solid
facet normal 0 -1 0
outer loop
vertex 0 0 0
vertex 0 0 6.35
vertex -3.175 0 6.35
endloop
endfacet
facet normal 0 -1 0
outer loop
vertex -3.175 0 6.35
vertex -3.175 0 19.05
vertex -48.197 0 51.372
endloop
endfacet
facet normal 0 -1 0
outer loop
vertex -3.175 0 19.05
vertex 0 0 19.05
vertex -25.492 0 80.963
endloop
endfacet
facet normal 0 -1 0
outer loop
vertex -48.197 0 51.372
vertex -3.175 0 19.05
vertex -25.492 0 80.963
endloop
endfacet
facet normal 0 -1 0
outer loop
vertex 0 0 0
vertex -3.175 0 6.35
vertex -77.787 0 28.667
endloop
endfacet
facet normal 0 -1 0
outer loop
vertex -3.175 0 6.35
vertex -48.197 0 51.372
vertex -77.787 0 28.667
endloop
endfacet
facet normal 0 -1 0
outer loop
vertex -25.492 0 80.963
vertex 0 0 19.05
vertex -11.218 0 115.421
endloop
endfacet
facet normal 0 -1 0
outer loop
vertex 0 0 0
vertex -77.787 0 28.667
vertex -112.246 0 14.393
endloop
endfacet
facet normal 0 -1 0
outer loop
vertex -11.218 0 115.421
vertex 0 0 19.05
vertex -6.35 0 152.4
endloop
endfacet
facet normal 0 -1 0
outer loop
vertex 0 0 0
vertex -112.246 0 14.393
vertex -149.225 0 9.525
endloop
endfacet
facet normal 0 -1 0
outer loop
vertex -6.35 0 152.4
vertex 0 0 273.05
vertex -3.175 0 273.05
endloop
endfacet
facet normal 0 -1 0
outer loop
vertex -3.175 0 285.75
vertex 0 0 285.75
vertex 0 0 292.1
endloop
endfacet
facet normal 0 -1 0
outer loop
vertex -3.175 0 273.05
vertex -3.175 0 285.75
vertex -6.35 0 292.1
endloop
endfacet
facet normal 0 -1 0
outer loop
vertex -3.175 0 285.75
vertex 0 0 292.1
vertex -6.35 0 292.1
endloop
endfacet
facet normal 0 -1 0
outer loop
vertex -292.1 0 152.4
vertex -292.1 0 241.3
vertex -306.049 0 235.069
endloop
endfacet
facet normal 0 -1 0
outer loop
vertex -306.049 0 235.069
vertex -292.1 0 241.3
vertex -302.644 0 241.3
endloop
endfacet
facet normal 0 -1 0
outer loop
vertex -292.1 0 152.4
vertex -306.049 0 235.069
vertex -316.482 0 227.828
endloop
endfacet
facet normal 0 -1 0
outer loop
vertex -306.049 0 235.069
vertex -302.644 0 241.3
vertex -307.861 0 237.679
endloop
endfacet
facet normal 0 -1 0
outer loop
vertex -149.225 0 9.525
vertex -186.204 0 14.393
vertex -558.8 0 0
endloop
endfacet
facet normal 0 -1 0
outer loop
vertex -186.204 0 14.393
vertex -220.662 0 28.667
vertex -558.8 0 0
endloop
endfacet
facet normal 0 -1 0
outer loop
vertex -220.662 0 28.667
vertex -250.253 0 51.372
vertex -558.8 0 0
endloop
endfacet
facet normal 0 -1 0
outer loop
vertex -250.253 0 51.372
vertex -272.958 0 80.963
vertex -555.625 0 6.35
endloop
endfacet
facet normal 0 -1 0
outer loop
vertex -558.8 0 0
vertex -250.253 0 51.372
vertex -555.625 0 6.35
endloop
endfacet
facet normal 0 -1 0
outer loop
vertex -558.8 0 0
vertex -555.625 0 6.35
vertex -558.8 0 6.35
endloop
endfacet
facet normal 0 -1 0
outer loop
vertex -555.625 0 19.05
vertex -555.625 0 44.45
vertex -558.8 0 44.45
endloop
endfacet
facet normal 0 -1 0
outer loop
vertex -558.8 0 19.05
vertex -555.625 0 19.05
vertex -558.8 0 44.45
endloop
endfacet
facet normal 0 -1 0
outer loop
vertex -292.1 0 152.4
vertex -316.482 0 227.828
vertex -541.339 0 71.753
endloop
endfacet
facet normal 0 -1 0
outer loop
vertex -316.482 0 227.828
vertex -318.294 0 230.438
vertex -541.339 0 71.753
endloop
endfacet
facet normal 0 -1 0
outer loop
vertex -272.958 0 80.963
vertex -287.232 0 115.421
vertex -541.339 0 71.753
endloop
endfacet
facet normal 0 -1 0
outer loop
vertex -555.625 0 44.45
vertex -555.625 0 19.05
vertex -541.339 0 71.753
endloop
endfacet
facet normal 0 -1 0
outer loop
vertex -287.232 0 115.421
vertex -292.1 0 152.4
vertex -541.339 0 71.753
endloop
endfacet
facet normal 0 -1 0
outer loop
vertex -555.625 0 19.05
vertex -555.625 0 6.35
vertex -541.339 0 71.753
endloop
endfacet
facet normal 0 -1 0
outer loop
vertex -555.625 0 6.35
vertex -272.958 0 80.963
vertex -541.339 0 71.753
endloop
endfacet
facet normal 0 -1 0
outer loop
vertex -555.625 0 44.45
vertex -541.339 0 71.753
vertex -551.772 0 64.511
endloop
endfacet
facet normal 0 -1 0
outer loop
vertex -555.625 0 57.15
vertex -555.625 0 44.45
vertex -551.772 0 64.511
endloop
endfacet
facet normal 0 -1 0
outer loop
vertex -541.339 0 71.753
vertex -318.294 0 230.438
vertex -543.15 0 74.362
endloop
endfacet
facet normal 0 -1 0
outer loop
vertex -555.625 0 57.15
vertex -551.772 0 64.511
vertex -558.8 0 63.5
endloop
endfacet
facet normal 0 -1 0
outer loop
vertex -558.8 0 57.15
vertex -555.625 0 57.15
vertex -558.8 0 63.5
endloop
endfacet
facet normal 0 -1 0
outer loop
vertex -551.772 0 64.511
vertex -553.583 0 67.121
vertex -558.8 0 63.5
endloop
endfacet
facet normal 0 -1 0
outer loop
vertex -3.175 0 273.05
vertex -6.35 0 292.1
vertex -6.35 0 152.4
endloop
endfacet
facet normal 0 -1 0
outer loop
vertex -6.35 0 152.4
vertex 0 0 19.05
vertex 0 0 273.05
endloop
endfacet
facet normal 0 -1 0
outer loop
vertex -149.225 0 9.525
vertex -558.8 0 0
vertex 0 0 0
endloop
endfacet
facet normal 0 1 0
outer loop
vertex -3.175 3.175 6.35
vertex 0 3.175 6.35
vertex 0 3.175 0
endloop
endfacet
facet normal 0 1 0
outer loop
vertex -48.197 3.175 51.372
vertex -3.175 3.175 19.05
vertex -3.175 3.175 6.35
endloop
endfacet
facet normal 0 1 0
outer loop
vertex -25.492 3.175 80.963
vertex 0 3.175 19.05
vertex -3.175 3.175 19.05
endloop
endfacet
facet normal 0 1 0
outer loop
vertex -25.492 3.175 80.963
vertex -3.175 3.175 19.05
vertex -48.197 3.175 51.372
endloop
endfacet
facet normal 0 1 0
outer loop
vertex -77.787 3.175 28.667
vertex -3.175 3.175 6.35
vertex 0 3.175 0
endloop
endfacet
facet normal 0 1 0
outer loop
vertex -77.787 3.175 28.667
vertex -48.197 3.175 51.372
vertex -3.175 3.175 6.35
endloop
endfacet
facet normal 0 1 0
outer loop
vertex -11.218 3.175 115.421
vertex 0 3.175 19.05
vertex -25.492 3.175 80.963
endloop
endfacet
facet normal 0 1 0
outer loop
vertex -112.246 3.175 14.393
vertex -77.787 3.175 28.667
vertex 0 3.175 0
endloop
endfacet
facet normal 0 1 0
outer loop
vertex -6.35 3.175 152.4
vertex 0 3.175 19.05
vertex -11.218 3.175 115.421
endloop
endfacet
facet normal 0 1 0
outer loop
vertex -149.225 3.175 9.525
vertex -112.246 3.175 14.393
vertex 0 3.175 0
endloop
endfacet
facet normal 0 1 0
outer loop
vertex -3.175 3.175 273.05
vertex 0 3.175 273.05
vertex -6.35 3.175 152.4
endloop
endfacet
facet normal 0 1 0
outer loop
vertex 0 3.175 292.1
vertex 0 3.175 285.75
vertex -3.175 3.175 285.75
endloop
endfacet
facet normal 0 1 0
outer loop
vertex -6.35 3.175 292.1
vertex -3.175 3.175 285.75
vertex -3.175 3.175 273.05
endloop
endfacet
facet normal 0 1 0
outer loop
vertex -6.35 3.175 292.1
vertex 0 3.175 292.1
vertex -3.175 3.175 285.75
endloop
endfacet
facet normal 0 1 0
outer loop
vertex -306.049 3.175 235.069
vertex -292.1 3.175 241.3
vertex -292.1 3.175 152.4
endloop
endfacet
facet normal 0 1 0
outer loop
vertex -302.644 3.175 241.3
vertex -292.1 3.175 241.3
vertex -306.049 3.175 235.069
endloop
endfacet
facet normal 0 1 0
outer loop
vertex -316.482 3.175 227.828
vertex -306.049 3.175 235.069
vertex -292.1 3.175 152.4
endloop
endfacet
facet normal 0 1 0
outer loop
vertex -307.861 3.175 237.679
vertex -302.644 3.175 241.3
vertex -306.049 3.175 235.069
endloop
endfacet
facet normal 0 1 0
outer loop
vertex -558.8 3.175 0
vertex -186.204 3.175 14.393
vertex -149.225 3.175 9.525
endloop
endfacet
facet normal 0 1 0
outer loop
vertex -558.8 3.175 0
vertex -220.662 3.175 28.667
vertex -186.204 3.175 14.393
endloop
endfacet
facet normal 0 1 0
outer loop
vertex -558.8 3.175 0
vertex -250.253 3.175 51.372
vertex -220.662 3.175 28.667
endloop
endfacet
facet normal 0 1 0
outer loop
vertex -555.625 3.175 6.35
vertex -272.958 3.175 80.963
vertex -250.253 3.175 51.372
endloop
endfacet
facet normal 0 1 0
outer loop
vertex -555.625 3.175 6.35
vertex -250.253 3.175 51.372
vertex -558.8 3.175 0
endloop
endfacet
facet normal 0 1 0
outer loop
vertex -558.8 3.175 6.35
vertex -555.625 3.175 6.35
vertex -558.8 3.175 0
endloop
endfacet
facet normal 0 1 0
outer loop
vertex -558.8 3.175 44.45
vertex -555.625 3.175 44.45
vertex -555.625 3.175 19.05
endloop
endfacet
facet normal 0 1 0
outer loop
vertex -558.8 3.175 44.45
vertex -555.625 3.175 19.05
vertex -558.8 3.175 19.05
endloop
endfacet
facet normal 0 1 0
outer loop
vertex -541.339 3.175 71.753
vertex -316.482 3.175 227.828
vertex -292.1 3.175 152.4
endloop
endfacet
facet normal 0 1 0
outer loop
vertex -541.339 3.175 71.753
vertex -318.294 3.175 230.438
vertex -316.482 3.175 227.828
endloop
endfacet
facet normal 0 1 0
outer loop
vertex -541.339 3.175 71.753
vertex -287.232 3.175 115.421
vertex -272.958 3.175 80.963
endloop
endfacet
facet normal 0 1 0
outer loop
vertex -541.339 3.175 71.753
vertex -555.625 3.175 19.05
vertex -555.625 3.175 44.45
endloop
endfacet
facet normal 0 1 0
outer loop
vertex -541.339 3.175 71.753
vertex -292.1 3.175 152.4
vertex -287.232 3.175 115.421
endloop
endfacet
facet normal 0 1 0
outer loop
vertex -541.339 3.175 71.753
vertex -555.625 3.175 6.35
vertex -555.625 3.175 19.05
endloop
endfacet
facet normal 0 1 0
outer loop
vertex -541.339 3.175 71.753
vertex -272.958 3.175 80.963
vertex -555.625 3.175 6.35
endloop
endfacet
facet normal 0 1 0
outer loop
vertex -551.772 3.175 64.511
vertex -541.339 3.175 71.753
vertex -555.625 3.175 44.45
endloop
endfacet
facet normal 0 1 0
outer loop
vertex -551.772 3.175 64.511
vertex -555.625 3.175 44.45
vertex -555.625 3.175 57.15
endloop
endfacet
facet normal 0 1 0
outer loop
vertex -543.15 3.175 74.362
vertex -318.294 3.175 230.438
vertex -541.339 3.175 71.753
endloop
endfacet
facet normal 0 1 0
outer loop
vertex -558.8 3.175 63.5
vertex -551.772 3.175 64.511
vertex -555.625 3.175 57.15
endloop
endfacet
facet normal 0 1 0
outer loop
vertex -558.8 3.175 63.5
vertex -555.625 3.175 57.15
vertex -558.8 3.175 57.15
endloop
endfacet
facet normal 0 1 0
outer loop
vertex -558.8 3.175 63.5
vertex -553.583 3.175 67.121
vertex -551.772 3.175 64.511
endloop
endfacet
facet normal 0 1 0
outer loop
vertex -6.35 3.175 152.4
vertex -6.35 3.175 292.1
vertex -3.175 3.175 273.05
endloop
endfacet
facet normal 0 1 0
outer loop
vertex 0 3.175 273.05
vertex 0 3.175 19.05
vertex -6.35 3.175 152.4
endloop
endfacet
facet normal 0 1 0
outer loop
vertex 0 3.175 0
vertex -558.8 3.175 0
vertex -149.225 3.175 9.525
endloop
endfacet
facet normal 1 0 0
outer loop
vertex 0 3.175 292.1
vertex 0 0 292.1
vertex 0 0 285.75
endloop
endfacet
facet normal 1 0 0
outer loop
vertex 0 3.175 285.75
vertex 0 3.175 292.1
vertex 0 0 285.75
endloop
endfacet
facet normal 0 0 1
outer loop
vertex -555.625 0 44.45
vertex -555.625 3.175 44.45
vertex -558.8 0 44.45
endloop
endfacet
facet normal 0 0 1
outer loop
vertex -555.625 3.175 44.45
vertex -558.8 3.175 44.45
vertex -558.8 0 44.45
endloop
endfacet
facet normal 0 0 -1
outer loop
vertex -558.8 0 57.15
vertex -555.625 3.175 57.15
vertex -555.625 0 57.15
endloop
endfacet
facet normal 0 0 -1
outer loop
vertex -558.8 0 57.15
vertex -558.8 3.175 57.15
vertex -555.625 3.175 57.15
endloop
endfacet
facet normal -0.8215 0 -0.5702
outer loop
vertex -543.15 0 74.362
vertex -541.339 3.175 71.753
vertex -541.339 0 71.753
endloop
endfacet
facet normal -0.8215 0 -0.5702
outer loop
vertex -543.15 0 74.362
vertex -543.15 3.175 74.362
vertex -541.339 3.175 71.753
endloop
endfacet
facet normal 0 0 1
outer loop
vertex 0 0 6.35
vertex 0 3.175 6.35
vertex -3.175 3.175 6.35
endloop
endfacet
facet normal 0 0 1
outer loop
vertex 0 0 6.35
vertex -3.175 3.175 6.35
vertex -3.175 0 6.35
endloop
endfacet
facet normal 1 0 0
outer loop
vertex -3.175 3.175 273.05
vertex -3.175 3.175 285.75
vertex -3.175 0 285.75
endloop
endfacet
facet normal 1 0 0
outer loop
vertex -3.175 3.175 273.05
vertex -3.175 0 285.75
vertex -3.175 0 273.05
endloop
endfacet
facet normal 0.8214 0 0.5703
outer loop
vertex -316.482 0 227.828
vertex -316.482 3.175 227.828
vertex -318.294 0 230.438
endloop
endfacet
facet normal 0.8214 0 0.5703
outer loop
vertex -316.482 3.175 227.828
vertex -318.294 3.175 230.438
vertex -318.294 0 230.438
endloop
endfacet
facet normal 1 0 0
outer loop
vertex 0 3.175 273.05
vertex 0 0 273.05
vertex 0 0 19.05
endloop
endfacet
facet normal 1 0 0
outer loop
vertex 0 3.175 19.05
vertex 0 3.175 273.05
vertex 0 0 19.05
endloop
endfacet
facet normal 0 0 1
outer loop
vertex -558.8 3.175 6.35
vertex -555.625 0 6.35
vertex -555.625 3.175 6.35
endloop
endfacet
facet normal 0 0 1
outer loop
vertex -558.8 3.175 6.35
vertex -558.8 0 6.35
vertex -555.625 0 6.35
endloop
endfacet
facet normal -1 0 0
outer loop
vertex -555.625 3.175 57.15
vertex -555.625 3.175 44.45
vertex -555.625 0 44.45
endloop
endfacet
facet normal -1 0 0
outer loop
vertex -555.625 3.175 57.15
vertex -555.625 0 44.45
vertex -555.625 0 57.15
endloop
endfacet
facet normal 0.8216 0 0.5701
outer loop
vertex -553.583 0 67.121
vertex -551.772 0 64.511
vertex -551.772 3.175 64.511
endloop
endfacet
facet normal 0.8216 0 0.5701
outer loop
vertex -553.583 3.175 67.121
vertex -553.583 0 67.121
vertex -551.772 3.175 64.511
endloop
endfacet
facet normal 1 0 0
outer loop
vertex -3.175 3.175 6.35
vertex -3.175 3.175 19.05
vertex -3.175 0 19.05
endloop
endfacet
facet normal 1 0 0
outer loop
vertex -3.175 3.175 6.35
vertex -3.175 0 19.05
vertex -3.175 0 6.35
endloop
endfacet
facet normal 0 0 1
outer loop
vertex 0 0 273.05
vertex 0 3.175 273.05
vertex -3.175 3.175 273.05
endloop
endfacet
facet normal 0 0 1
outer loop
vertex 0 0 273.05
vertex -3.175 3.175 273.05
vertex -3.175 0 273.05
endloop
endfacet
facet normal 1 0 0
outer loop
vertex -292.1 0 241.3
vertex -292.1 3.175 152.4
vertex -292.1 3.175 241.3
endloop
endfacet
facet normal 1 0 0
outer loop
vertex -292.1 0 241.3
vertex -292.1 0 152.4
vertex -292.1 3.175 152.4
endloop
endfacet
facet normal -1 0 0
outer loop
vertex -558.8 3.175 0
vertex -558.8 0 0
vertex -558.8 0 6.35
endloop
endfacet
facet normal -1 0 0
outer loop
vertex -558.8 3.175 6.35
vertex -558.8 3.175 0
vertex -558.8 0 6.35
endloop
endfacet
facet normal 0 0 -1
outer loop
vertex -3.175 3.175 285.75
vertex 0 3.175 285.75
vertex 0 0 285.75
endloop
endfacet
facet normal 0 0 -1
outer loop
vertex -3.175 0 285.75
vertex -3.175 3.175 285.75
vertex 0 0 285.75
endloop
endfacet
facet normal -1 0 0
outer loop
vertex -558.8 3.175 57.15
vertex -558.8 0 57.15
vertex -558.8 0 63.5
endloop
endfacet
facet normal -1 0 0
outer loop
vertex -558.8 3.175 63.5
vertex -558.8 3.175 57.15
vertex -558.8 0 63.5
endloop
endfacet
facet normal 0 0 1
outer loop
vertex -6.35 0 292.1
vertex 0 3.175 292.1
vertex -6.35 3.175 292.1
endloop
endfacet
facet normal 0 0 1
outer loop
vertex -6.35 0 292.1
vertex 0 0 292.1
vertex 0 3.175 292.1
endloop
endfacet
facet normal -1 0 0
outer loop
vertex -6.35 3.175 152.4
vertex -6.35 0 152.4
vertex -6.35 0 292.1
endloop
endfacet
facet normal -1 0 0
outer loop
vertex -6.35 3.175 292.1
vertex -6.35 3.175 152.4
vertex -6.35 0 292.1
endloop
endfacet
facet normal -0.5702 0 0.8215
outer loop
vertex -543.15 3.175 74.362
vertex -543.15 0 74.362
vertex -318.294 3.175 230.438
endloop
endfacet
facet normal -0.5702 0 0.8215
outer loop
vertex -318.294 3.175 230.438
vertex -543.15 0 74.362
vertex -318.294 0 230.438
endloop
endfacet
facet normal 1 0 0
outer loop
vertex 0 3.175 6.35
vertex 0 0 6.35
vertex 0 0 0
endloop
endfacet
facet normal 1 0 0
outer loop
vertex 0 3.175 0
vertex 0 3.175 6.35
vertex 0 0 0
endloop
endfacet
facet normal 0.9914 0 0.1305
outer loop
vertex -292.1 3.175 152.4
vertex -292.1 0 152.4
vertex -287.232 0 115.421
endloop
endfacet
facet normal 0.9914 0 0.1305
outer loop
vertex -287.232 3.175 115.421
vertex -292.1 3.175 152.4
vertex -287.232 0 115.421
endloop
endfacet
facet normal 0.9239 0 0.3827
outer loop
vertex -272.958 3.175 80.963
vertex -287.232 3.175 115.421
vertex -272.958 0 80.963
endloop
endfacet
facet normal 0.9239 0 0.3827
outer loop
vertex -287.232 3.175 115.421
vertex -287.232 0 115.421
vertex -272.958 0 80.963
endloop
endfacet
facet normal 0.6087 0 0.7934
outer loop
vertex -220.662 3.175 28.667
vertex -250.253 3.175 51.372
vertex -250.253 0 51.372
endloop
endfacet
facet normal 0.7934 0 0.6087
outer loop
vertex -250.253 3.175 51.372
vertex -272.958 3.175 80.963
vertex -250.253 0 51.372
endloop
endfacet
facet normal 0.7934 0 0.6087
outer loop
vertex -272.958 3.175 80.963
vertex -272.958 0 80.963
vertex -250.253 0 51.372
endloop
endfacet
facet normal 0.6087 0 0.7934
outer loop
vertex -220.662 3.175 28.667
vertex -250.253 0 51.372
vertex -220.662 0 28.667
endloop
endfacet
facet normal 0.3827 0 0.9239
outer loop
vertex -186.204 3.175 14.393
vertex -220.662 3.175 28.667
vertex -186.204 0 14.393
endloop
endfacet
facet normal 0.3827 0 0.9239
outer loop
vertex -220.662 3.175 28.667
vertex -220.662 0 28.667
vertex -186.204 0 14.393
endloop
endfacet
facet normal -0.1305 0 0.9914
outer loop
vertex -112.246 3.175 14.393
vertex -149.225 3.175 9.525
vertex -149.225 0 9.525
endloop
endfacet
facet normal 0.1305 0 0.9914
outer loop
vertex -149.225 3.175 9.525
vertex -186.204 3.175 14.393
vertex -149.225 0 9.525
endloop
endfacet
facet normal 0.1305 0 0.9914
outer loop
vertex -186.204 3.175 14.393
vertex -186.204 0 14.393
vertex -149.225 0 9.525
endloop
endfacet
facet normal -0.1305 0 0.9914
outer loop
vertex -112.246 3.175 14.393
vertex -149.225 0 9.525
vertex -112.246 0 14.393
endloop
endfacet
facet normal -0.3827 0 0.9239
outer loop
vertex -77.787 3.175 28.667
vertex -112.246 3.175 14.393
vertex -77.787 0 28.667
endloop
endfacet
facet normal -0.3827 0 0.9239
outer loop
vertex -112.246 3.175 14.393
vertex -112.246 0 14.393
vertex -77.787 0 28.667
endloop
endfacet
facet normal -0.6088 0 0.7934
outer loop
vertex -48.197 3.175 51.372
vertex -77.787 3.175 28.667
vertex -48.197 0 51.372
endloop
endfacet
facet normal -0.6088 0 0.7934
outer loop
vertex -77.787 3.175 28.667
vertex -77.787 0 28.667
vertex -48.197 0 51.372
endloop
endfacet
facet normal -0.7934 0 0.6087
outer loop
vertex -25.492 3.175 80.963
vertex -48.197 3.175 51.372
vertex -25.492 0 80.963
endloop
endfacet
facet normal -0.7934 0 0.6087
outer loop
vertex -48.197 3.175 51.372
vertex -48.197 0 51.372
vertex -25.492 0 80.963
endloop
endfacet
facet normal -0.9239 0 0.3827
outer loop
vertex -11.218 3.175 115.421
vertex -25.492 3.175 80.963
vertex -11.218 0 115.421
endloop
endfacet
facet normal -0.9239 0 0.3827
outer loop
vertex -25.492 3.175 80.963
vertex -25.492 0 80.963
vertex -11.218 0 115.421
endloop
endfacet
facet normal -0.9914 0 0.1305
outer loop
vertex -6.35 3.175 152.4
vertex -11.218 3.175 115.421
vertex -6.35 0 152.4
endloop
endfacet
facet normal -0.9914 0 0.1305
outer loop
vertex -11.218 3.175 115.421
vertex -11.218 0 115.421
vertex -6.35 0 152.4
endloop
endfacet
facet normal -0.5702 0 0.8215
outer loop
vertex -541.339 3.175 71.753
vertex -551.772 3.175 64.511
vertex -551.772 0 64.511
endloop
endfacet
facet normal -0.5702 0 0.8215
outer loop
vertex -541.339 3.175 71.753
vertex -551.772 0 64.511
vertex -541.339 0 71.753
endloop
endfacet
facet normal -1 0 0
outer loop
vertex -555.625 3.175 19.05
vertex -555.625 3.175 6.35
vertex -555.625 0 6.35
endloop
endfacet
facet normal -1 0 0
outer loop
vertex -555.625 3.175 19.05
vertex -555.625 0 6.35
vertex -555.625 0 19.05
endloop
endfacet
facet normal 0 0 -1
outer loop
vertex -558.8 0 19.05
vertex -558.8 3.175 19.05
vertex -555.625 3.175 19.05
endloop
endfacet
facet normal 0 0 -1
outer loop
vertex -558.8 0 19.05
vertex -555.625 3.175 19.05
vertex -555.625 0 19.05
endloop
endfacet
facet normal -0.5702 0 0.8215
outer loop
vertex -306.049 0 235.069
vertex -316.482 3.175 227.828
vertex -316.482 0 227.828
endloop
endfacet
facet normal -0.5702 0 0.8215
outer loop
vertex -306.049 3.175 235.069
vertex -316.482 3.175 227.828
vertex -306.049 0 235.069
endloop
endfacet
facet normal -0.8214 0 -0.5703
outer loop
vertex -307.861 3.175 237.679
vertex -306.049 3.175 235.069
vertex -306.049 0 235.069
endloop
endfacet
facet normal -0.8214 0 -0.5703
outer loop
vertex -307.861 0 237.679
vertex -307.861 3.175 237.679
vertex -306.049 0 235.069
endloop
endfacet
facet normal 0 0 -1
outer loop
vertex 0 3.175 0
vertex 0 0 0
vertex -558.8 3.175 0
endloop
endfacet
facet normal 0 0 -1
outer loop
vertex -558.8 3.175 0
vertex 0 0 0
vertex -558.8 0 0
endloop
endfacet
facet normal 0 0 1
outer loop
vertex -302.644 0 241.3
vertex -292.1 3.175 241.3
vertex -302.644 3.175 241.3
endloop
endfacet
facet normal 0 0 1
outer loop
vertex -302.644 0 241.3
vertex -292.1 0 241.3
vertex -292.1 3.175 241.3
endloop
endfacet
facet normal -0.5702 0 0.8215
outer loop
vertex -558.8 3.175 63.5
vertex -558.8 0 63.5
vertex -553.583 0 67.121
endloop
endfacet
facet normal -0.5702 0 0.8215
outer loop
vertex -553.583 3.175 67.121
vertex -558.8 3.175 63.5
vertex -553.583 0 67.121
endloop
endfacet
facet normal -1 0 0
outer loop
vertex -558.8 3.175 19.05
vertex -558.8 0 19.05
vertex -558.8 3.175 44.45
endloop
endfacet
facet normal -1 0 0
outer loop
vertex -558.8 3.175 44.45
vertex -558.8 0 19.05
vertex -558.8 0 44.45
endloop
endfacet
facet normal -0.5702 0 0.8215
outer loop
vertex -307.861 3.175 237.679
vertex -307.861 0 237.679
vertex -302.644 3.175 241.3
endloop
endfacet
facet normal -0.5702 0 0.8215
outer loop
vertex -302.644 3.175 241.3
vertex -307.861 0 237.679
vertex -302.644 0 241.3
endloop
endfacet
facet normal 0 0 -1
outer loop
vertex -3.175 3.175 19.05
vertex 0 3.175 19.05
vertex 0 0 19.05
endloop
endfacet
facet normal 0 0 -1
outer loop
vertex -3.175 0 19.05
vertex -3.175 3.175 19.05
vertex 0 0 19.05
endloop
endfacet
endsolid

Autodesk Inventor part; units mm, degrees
ref_plane "YZ Plane" through (0, 0, 0) normal (1, 0, 0) x (0, 1, 0)
ref_plane "XZ Plane" through (0, 0, 0) normal (0, 1, 0) x (-1, 0, 0)
ref_plane "XY Plane" through (0, 0, 0) normal (0, 0, 1) x (1, 0, 0)
sketch "Sketch1" plane through (0, 0, 0) normal (0, 1, 0) x (-1, 0, 0)
  line L0 (0, 0) -> (558.8, 0)
  line L1 (0, 292.1) -> (0, 0)
  arc A0 (6.35, 152.4) -> (292.1, 152.4) centre (149.225, 152.4) ccw
  line L2 (292.1, 152.4) -> (292.1, 241.3)
  line L3 (6.35, 152.4) -> (6.35, 292.1)
  line L4 (0, 292.1) -> (6.35, 292.1)
  line L5 (292.1, 241.3) -> (302.6441, 241.3)
  line L6 (558.8, 0) -> (558.8, 63.5)
  line L7 (558.8, 63.5) -> (302.6441, 241.3)
  point P0 (297.372, 241.3)
  dimension "d0" = 558.8
  dimension "d3" = 285.75
  dimension "d10" = 292.1
  dimension "d14" = 63.5
  dimension "d33" = 241.3
  dimension "d34" = 139.7
  dimension "d37" = 6.35
extrude "Extrusion2" add sketch "Sketch1" along normal blind 3.175
sketch "Sketch2" plane through (-558.8, 0, 0) normal (-1, 0, 0) x (0, 0, 1)
  line L0 (0, 0) -> (63.5, 0) projected
  line L1 (63.5, 0) -> (63.5, 3.175) projected
  line L2 (0, 3.175) -> (63.5, 3.175) projected
  line L3 (0, 0) -> (0, 3.175) projected
  line L4 (6.35, 0) -> (6.35, 3.175)
  line L5 (19.05, 3.175) -> (19.05, 0)
  line L6 (57.15, 3.175) -> (57.15, 0)
  line L7 (44.45, 3.175) -> (44.45, 0)
  dimension "d15" = 6.35
  dimension "d16" = 12.7
  dimension "d17" = 12.7
  dimension "d18" = 6.35
extrude "Extrusion3" cut sketch "Sketch2" against normal blind 3.175 contours L4 L2 L5 L0 | L7 L2 L6 L0
sketch "Sketch3" plane through (-558.8, 0, 63.5) normal (-0.5702096, 0, 0.8214993) x (0.8214993, 0, 0.5702096)
  line L0 (0, 0) -> (311.8152, 0) projected
  line L1 (311.8152, 0) -> (311.8152, 3.175) projected
  line L2 (0, 3.175) -> (311.8152, 3.175) projected
  line L3 (0, 0) -> (0, 3.175) projected
  line L4 (6.35, 0) -> (6.35, 3.175)
  line L5 (19.05, 3.175) -> (19.05, 0)
  line L6 (305.4652, 3.175) -> (305.4652, 0)
  line L7 (292.7652, 3.175) -> (292.7652, 0)
  point P0 (422.8455, 0)
  dimension "d21" = 12.7
  dimension "d22" = 6.35
  dimension "d23" = 6.35
  dimension "d24" = 12.7
extrude "Extrusion4" cut sketch "Sketch3" against normal blind 3.175 contours L4 L2 L5 L0 | L7 L2 L6 L0
sketch "Sketch4" plane through (0, 0, 292.1) normal (1, 0, 0) x (0, 0, -1)
  line L0 (0, 0) -> (292.1, 0) projected
  line L1 (292.1, 0) -> (292.1, 3.175) projected
  line L2 (0, 3.175) -> (292.1, 3.175) projected
  line L3 (285.75, 3.175) -> (285.75, 0)
  line L4 (273.05, 3.175) -> (273.05, 0)
  line L5 (6.35, 3.175) -> (6.35, 0)
  line L6 (19.05, 3.175) -> (19.05, 0)
  dimension "d27" = 12.7
  dimension "d28" = 12.7
  dimension "d29" = 6.35
  dimension "d30" = 254
extrude "Extrusion5" cut sketch "Sketch4" against normal blind 3.175 contours L5 L2 L6 L0 | L4 L2 L3 L0
properties part number "Top" material "Polycarbonate, Clear"
